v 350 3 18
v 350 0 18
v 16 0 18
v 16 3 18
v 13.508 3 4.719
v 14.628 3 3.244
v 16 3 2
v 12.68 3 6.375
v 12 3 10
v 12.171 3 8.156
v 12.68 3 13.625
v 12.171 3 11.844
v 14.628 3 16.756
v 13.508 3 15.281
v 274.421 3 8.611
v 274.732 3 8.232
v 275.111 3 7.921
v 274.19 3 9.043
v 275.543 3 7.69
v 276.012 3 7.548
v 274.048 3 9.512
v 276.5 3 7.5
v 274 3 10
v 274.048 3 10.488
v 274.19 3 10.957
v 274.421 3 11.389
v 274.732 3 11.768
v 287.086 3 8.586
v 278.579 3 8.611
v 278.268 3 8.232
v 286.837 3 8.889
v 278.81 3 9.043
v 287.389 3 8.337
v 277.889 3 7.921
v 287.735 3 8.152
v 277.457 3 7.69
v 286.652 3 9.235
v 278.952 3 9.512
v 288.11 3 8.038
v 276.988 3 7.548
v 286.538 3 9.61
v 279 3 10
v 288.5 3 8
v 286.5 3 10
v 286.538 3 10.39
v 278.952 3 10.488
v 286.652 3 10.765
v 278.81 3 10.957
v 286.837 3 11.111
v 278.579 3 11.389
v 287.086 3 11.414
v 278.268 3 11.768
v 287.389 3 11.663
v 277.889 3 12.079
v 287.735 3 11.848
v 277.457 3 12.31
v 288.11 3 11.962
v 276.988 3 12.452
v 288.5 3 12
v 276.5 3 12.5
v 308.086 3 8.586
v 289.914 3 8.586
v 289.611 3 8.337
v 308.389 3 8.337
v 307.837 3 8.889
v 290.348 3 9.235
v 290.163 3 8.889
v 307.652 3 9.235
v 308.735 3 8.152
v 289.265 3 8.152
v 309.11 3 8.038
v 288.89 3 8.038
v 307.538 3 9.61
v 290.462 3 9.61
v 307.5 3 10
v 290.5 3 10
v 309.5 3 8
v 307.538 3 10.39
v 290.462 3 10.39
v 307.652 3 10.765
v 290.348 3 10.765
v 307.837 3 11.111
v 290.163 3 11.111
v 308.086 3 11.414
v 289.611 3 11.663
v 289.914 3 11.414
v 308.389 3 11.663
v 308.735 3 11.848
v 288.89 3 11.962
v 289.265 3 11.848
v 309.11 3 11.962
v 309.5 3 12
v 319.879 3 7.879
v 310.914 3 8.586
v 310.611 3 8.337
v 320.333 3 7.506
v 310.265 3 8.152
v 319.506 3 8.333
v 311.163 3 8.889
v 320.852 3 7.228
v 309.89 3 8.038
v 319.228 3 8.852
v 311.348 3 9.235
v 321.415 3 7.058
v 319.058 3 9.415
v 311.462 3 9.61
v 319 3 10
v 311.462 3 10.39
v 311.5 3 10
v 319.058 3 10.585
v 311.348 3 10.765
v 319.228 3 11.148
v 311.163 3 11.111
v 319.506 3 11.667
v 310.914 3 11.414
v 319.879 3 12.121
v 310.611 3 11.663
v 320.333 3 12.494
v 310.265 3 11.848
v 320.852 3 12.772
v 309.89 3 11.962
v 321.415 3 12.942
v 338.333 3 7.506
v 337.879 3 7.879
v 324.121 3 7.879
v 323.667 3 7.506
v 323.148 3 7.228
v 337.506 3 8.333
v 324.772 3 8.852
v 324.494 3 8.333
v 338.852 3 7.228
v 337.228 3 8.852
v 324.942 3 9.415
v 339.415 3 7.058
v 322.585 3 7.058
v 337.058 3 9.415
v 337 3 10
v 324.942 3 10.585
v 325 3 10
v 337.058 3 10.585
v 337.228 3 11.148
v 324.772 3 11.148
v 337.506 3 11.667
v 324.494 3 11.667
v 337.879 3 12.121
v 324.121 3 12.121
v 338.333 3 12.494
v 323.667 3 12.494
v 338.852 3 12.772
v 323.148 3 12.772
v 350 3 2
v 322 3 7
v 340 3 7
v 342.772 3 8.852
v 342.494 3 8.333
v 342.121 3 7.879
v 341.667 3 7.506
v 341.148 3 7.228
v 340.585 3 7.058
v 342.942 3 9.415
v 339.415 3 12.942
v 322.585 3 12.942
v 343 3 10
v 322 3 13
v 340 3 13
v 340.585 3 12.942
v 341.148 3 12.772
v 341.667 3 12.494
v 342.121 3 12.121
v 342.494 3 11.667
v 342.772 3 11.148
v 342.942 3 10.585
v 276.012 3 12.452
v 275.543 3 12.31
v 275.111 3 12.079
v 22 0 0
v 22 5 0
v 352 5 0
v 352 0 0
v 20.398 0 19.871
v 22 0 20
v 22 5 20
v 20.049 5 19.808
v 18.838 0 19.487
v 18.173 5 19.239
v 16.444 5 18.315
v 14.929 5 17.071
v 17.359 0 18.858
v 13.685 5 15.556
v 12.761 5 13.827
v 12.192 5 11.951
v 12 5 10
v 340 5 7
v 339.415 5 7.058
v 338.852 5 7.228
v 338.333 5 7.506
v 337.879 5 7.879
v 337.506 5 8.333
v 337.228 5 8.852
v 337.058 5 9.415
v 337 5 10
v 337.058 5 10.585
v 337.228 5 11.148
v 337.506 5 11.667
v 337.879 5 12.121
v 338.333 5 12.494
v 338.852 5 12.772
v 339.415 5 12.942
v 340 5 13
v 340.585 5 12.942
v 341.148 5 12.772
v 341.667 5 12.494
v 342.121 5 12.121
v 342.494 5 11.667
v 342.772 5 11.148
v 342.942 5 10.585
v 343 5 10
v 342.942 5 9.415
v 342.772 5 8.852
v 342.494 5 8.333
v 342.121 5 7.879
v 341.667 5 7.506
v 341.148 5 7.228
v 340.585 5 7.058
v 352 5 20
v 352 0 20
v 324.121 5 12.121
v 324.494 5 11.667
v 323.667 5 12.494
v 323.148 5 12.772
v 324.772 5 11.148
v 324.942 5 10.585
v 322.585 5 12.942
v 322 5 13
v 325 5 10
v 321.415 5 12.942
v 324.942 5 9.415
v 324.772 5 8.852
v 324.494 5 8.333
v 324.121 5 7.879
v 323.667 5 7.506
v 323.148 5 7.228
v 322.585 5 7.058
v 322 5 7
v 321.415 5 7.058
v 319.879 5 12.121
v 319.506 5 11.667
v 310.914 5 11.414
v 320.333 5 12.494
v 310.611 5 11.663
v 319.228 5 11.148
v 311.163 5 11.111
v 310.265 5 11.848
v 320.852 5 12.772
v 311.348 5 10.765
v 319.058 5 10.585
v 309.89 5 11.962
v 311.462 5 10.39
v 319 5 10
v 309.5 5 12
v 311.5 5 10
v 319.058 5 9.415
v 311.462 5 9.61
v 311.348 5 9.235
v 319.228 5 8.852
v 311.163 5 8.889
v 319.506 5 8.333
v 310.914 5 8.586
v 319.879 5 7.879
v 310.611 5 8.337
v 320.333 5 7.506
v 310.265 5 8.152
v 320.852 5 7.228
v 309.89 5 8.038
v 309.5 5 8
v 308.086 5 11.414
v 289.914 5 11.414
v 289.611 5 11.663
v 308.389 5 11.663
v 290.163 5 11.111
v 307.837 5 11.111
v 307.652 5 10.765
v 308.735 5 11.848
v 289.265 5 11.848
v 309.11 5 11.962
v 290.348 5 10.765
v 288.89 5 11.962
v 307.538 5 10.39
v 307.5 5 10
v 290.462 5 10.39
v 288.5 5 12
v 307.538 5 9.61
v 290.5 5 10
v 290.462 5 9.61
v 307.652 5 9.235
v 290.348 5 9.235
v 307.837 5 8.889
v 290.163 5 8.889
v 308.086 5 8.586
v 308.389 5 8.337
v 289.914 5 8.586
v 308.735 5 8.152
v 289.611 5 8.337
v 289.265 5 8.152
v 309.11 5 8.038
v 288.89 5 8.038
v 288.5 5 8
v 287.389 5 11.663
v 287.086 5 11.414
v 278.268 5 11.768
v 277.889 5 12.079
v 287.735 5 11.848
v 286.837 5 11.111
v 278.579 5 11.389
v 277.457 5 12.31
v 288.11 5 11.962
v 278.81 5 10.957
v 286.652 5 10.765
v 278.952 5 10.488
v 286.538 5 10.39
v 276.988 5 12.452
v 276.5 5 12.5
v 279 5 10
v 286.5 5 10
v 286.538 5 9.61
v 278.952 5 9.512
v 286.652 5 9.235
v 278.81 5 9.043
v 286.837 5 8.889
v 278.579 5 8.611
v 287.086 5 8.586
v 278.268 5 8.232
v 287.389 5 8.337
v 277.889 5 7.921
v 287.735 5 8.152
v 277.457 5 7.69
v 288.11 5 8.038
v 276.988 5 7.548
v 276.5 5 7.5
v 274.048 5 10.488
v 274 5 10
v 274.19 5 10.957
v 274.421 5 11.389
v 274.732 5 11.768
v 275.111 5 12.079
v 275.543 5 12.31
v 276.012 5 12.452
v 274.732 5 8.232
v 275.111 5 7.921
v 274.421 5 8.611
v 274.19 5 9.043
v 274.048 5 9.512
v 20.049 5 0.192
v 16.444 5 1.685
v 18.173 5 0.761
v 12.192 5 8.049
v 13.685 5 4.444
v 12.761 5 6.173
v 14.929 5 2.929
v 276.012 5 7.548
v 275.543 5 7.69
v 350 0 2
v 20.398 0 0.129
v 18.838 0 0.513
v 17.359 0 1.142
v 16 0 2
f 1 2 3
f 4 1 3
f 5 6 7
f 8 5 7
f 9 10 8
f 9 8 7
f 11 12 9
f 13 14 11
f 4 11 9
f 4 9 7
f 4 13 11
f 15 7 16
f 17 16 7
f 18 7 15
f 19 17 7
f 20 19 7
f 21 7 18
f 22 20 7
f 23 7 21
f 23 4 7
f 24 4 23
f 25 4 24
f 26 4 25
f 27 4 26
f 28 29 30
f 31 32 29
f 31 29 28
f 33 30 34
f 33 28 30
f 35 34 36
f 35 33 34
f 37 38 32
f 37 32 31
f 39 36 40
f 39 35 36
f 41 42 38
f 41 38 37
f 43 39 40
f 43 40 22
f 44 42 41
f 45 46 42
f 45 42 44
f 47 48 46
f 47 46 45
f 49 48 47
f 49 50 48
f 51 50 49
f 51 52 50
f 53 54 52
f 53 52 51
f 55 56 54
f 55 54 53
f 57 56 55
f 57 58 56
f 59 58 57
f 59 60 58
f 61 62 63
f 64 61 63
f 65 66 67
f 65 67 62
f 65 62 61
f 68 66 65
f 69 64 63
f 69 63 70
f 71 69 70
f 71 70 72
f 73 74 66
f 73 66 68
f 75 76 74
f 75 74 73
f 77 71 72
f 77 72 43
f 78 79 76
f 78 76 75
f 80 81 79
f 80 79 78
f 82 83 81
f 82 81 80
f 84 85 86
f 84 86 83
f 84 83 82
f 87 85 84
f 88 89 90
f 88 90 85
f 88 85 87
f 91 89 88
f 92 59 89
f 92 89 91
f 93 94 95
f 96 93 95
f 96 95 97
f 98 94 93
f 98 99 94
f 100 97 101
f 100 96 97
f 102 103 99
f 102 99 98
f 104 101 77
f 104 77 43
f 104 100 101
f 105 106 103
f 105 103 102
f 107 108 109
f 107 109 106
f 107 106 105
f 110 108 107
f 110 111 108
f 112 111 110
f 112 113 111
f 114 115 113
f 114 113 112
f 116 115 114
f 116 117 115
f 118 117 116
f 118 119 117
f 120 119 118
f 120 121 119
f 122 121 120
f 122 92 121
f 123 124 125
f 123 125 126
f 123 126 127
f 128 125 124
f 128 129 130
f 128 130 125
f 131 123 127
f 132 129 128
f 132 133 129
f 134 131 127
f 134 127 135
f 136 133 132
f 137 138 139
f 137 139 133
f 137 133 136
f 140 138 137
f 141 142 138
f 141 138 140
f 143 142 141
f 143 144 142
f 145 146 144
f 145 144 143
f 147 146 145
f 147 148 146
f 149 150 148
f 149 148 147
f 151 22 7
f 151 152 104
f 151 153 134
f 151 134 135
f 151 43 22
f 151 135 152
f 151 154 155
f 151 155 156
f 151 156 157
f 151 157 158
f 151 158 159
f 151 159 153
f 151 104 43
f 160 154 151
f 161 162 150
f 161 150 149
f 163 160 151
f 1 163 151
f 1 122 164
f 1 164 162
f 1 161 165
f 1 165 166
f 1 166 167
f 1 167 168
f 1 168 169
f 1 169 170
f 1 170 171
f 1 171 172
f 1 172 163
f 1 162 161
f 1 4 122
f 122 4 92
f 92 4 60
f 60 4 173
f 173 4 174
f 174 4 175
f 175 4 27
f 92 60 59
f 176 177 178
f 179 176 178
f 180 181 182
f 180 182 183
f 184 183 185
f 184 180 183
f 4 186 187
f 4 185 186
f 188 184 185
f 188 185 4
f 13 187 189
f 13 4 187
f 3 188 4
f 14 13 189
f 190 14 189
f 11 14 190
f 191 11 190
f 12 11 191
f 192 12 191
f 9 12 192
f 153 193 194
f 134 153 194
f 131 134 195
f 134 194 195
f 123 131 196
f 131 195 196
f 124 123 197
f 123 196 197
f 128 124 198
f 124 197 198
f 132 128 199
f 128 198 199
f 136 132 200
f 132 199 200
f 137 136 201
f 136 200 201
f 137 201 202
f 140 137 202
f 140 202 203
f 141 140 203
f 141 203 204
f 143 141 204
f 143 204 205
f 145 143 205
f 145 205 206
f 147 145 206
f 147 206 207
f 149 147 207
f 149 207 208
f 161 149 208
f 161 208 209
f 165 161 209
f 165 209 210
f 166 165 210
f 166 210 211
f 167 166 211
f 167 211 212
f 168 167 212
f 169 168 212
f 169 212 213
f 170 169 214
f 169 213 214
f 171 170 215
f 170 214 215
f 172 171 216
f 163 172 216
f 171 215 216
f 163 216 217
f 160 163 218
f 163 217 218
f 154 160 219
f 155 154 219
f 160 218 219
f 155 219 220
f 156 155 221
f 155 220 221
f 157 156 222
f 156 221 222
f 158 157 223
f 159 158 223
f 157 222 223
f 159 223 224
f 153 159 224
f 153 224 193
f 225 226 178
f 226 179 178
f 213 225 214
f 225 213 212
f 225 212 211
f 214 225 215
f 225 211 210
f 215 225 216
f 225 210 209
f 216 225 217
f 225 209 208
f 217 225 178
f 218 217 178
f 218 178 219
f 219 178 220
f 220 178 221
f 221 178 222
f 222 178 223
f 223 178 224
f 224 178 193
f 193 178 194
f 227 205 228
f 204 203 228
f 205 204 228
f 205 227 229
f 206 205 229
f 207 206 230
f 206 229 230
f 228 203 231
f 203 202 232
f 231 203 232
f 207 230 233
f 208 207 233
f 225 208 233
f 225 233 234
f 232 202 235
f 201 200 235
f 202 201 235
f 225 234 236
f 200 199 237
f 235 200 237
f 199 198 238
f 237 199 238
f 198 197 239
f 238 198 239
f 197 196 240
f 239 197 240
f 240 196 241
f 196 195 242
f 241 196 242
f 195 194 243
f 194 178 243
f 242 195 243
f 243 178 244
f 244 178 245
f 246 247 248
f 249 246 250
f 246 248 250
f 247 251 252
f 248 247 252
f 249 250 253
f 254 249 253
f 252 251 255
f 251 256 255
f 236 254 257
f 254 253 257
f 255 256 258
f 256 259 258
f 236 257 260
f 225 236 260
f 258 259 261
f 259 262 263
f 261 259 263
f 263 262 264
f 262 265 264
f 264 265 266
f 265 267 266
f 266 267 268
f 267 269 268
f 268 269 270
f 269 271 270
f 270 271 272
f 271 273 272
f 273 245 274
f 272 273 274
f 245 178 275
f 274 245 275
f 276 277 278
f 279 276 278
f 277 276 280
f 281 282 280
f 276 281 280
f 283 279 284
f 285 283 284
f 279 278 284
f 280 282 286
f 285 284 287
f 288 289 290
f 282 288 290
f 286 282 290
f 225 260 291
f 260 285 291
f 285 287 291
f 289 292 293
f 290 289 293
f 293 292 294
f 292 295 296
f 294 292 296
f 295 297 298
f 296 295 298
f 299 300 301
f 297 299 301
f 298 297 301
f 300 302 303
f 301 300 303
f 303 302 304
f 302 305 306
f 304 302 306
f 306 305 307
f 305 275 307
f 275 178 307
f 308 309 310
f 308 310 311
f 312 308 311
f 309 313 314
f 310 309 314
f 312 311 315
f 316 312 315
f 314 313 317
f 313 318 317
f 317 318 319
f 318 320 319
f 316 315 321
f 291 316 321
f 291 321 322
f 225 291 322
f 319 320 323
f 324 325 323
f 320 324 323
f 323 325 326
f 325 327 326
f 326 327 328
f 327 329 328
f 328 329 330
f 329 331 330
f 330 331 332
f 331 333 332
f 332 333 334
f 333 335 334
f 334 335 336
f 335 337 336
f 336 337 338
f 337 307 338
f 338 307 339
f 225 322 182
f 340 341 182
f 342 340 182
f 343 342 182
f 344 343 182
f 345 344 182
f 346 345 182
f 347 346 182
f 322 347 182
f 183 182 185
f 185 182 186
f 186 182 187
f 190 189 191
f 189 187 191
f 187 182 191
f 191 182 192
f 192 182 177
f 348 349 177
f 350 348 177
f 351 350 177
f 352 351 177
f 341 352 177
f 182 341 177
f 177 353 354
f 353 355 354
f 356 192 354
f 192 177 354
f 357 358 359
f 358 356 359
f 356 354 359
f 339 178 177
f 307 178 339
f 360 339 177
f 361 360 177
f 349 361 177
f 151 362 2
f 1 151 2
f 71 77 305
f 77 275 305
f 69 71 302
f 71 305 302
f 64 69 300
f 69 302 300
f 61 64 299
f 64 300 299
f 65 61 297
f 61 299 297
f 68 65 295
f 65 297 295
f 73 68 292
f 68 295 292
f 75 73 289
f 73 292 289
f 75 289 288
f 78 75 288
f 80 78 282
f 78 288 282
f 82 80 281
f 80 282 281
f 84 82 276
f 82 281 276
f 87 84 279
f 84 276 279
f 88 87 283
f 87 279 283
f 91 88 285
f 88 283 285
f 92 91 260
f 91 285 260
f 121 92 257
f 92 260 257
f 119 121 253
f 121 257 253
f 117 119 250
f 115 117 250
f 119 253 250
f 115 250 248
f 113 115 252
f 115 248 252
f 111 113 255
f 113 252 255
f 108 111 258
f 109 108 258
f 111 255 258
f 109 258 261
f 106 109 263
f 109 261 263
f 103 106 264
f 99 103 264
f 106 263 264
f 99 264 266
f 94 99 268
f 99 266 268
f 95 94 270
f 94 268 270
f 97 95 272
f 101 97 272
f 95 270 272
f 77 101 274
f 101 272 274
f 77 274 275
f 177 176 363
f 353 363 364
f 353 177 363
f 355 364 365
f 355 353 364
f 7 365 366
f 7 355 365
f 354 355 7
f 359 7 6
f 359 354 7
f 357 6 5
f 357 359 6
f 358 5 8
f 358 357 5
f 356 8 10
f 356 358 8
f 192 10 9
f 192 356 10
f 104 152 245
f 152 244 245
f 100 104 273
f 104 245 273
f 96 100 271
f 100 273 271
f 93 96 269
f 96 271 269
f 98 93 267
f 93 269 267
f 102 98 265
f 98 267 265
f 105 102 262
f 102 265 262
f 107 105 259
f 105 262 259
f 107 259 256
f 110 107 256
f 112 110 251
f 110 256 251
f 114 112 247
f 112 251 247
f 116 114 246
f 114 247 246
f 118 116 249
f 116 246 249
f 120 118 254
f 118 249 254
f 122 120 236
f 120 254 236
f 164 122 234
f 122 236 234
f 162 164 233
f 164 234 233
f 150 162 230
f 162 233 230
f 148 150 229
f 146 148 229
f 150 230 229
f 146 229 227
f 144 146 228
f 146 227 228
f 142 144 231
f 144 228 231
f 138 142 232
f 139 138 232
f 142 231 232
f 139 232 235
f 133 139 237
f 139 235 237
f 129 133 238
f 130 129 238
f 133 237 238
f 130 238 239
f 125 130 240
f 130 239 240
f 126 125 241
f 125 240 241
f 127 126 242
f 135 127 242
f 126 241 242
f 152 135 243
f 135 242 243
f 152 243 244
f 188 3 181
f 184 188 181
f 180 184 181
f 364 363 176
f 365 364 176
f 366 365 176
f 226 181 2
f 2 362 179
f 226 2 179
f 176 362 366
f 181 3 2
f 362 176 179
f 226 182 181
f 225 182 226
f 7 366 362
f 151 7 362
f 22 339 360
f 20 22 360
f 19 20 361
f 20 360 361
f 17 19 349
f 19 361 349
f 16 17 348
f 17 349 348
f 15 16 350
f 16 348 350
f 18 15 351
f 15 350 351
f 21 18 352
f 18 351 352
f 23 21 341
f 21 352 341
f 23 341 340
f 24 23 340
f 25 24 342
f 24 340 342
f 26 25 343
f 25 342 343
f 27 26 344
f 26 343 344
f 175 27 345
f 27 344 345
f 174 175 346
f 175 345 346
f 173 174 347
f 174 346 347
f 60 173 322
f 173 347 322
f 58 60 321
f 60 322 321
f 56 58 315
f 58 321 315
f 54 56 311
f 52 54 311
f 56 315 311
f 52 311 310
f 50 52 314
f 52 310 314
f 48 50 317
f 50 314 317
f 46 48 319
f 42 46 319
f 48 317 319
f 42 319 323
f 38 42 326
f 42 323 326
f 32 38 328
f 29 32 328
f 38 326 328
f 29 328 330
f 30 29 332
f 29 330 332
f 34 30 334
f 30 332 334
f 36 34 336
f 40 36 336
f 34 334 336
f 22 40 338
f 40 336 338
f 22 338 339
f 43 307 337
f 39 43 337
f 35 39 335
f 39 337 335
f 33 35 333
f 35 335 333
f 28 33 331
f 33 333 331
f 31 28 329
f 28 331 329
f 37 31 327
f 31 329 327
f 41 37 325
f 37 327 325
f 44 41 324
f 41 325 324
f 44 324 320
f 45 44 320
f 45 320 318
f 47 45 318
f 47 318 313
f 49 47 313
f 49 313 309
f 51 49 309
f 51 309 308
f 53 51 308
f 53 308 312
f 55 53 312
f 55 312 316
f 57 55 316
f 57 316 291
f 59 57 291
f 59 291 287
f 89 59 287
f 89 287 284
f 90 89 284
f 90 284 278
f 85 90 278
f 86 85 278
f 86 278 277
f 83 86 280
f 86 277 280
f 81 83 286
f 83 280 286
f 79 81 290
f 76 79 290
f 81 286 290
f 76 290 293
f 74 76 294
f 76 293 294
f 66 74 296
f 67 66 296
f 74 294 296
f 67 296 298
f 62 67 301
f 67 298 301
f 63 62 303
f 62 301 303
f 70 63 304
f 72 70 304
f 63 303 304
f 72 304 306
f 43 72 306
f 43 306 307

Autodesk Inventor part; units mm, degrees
ref_plane "YZ Plane" through (0, 0, 0) normal (1, 0, 0) x (0, 1, 0)
ref_plane "XZ Plane" through (0, 0, 0) normal (0, 1, 0) x (-1, 0, 0)
ref_plane "XY Plane" through (0, 0, 0) normal (0, 0, 1) x (1, 0, 0)
sketch "スケッチ1" plane through (0, 0, 0) normal (0, 0, 1) x (1, 0, 0)
  line L0 (0, 0) -> (352, 0)
  line L1 (352, 0) -> (352, 5)
  line L2 (352, 5) -> (0, 5)
  line L3 (0, 5) -> (0, 0)
  line L4 (0, 0) -> (6, 0)
  line L5 (0, 1) -> (0, 0)
  dimension "d0" = 352
  dimension "d1" = 5
extrude "押し出し1" add sketch "スケッチ1" along normal blind 20
sketch "スケッチ3" plane through (0, 0, 0) normal (-1, 0, 0) x (0, 0, 1)
  line L0 (0, 5) -> (0, 0) projected
  line L1 (0, 0) -> (20, 0) projected
  line L2 (20, 5) -> (20, 0) projected
  line L3 (0, 5) -> (20, 5) projected
  circle A0 centre (4, 2) radius 1.2
  circle A1 centre (16, 3) radius 1.2
  dimension "d14" = 2.4
  dimension "d15" = 2.4
  dimension "d16" = 3
  dimension "d17" = 4
  dimension "d18" = 4
  dimension "d19" = 3
extrude "押し出し3" cut sketch "スケッチ3" against normal blind 6 contours A0 | A1
sketch "スケッチ4" plane through (0, 0, 0) normal (0, -1, 0) x (1, 0, 0)
  line L0 (0, 0) -> (352, 0) projected
  line L1 (352, 0) -> (352, 20) projected
  line L2 (0, 20) -> (352, 20) projected
  line L3 (0, 0) -> (0, 20) projected
  line L4 (2, 2) -> (350, 2)
  line L5 (350, 2) -> (350, 18)
  line L6 (350, 18) -> (2, 18)
  line L7 (2, 18) -> (2, 2)
  dimension "d22" = 2
  dimension "d23" = 2
  dimension "d24" = 2
  dimension "d25" = 2
extrude "押し出し4" cut sketch "スケッチ4" against normal blind 3 contours L7 L6 L5 L4
sketch "スケッチ6" plane through (0, 3, 0) normal (0, -1, 0) x (1, 0, 0)
  line L0 (350, 18) -> (350, 2) projected
  line L1 (2, 18) -> (350, 18) projected
  point P0 (0, 0)
  point P1 (340, 10)
  dimension "d35" = 10
  dimension "d36" = 8
  dimension "d37" = 16
hole "穴1" at (340, 3, 10) direction (0, 1, 0) diameter 6 end through all
sketch "スケッチ7" plane through (0, 3, 0) normal (0, -1, 0) x (1, 0, 0)
  circle A0 centre (340, 10) radius 3 projected
  line L0 (340, 10) -> (322, 10)
  point P0 (0, 0)
  dimension "d38" = 18
hole "穴2" at (322, 3, 10) direction (0, 1, 0) diameter 6 end through all
sketch "スケッチ8" plane through (0, 3, 0) normal (0, -1, 0) x (1, 0, 0)
  circle A0 centre (322, 10) radius 3 projected
  line L0 (322, 10) -> (309.5, 10)
  point P0 (0, 0)
  dimension "d46" = 12.5
hole "穴3" at (309.5, 3, 10) direction (0, 1, 0) diameter 4 end through all
sketch "スケッチ9" plane through (0, 3, 0) normal (0, -1, 0) x (1, 0, 0)
  circle A0 centre (309.5, 10) radius 2 projected
  line L0 (309.5, 10) -> (288.5, 10)
  point P0 (0, 0)
  dimension "d54" = 21
hole "穴4" at (288.5, 3, 10) direction (0, 1, 0) diameter 4 end through all
sketch "スケッチ10" plane through (0, 3, 0) normal (0, -1, 0) x (1, 0, 0)
  circle A0 centre (288.5, 10) radius 2 projected
  line L0 (288.5, 10) -> (276.5, 10)
  point P0 (0, 0)
  dimension "d62" = 12
hole "穴5" at (276.5, 3, 10) direction (0, 1, 0) diameter 5 end through all
sketch "スケッチ11" plane through (0, 0, 0) normal (0, 0, -1) x (-1, 0, 0)
  line L0 (0, 0) -> (-352, 0) projected
  line L1 (0, 5) -> (0, 0) projected
  line L2 (-352, 5) -> (0, 5) projected
  line L3 (-352, 5) -> (0, 5) projected
  line L4 (0, 0) -> (-12, 0)
  line L5 (-12, 0) -> (-12, 5)
  line L6 (-12, 5) -> (0, 5)
  line L7 (0, 5) -> (0, 0)
  dimension "d70" = 12
extrude "押し出し5" cut sketch "スケッチ11" against normal through all
fillet "フィレット1" radius 10 2 edges at (12, 2.5, 20) (12, 2.5, 0)
equation "\"d36\" = 0.5 * d37"
properties part number "arm1_L"
